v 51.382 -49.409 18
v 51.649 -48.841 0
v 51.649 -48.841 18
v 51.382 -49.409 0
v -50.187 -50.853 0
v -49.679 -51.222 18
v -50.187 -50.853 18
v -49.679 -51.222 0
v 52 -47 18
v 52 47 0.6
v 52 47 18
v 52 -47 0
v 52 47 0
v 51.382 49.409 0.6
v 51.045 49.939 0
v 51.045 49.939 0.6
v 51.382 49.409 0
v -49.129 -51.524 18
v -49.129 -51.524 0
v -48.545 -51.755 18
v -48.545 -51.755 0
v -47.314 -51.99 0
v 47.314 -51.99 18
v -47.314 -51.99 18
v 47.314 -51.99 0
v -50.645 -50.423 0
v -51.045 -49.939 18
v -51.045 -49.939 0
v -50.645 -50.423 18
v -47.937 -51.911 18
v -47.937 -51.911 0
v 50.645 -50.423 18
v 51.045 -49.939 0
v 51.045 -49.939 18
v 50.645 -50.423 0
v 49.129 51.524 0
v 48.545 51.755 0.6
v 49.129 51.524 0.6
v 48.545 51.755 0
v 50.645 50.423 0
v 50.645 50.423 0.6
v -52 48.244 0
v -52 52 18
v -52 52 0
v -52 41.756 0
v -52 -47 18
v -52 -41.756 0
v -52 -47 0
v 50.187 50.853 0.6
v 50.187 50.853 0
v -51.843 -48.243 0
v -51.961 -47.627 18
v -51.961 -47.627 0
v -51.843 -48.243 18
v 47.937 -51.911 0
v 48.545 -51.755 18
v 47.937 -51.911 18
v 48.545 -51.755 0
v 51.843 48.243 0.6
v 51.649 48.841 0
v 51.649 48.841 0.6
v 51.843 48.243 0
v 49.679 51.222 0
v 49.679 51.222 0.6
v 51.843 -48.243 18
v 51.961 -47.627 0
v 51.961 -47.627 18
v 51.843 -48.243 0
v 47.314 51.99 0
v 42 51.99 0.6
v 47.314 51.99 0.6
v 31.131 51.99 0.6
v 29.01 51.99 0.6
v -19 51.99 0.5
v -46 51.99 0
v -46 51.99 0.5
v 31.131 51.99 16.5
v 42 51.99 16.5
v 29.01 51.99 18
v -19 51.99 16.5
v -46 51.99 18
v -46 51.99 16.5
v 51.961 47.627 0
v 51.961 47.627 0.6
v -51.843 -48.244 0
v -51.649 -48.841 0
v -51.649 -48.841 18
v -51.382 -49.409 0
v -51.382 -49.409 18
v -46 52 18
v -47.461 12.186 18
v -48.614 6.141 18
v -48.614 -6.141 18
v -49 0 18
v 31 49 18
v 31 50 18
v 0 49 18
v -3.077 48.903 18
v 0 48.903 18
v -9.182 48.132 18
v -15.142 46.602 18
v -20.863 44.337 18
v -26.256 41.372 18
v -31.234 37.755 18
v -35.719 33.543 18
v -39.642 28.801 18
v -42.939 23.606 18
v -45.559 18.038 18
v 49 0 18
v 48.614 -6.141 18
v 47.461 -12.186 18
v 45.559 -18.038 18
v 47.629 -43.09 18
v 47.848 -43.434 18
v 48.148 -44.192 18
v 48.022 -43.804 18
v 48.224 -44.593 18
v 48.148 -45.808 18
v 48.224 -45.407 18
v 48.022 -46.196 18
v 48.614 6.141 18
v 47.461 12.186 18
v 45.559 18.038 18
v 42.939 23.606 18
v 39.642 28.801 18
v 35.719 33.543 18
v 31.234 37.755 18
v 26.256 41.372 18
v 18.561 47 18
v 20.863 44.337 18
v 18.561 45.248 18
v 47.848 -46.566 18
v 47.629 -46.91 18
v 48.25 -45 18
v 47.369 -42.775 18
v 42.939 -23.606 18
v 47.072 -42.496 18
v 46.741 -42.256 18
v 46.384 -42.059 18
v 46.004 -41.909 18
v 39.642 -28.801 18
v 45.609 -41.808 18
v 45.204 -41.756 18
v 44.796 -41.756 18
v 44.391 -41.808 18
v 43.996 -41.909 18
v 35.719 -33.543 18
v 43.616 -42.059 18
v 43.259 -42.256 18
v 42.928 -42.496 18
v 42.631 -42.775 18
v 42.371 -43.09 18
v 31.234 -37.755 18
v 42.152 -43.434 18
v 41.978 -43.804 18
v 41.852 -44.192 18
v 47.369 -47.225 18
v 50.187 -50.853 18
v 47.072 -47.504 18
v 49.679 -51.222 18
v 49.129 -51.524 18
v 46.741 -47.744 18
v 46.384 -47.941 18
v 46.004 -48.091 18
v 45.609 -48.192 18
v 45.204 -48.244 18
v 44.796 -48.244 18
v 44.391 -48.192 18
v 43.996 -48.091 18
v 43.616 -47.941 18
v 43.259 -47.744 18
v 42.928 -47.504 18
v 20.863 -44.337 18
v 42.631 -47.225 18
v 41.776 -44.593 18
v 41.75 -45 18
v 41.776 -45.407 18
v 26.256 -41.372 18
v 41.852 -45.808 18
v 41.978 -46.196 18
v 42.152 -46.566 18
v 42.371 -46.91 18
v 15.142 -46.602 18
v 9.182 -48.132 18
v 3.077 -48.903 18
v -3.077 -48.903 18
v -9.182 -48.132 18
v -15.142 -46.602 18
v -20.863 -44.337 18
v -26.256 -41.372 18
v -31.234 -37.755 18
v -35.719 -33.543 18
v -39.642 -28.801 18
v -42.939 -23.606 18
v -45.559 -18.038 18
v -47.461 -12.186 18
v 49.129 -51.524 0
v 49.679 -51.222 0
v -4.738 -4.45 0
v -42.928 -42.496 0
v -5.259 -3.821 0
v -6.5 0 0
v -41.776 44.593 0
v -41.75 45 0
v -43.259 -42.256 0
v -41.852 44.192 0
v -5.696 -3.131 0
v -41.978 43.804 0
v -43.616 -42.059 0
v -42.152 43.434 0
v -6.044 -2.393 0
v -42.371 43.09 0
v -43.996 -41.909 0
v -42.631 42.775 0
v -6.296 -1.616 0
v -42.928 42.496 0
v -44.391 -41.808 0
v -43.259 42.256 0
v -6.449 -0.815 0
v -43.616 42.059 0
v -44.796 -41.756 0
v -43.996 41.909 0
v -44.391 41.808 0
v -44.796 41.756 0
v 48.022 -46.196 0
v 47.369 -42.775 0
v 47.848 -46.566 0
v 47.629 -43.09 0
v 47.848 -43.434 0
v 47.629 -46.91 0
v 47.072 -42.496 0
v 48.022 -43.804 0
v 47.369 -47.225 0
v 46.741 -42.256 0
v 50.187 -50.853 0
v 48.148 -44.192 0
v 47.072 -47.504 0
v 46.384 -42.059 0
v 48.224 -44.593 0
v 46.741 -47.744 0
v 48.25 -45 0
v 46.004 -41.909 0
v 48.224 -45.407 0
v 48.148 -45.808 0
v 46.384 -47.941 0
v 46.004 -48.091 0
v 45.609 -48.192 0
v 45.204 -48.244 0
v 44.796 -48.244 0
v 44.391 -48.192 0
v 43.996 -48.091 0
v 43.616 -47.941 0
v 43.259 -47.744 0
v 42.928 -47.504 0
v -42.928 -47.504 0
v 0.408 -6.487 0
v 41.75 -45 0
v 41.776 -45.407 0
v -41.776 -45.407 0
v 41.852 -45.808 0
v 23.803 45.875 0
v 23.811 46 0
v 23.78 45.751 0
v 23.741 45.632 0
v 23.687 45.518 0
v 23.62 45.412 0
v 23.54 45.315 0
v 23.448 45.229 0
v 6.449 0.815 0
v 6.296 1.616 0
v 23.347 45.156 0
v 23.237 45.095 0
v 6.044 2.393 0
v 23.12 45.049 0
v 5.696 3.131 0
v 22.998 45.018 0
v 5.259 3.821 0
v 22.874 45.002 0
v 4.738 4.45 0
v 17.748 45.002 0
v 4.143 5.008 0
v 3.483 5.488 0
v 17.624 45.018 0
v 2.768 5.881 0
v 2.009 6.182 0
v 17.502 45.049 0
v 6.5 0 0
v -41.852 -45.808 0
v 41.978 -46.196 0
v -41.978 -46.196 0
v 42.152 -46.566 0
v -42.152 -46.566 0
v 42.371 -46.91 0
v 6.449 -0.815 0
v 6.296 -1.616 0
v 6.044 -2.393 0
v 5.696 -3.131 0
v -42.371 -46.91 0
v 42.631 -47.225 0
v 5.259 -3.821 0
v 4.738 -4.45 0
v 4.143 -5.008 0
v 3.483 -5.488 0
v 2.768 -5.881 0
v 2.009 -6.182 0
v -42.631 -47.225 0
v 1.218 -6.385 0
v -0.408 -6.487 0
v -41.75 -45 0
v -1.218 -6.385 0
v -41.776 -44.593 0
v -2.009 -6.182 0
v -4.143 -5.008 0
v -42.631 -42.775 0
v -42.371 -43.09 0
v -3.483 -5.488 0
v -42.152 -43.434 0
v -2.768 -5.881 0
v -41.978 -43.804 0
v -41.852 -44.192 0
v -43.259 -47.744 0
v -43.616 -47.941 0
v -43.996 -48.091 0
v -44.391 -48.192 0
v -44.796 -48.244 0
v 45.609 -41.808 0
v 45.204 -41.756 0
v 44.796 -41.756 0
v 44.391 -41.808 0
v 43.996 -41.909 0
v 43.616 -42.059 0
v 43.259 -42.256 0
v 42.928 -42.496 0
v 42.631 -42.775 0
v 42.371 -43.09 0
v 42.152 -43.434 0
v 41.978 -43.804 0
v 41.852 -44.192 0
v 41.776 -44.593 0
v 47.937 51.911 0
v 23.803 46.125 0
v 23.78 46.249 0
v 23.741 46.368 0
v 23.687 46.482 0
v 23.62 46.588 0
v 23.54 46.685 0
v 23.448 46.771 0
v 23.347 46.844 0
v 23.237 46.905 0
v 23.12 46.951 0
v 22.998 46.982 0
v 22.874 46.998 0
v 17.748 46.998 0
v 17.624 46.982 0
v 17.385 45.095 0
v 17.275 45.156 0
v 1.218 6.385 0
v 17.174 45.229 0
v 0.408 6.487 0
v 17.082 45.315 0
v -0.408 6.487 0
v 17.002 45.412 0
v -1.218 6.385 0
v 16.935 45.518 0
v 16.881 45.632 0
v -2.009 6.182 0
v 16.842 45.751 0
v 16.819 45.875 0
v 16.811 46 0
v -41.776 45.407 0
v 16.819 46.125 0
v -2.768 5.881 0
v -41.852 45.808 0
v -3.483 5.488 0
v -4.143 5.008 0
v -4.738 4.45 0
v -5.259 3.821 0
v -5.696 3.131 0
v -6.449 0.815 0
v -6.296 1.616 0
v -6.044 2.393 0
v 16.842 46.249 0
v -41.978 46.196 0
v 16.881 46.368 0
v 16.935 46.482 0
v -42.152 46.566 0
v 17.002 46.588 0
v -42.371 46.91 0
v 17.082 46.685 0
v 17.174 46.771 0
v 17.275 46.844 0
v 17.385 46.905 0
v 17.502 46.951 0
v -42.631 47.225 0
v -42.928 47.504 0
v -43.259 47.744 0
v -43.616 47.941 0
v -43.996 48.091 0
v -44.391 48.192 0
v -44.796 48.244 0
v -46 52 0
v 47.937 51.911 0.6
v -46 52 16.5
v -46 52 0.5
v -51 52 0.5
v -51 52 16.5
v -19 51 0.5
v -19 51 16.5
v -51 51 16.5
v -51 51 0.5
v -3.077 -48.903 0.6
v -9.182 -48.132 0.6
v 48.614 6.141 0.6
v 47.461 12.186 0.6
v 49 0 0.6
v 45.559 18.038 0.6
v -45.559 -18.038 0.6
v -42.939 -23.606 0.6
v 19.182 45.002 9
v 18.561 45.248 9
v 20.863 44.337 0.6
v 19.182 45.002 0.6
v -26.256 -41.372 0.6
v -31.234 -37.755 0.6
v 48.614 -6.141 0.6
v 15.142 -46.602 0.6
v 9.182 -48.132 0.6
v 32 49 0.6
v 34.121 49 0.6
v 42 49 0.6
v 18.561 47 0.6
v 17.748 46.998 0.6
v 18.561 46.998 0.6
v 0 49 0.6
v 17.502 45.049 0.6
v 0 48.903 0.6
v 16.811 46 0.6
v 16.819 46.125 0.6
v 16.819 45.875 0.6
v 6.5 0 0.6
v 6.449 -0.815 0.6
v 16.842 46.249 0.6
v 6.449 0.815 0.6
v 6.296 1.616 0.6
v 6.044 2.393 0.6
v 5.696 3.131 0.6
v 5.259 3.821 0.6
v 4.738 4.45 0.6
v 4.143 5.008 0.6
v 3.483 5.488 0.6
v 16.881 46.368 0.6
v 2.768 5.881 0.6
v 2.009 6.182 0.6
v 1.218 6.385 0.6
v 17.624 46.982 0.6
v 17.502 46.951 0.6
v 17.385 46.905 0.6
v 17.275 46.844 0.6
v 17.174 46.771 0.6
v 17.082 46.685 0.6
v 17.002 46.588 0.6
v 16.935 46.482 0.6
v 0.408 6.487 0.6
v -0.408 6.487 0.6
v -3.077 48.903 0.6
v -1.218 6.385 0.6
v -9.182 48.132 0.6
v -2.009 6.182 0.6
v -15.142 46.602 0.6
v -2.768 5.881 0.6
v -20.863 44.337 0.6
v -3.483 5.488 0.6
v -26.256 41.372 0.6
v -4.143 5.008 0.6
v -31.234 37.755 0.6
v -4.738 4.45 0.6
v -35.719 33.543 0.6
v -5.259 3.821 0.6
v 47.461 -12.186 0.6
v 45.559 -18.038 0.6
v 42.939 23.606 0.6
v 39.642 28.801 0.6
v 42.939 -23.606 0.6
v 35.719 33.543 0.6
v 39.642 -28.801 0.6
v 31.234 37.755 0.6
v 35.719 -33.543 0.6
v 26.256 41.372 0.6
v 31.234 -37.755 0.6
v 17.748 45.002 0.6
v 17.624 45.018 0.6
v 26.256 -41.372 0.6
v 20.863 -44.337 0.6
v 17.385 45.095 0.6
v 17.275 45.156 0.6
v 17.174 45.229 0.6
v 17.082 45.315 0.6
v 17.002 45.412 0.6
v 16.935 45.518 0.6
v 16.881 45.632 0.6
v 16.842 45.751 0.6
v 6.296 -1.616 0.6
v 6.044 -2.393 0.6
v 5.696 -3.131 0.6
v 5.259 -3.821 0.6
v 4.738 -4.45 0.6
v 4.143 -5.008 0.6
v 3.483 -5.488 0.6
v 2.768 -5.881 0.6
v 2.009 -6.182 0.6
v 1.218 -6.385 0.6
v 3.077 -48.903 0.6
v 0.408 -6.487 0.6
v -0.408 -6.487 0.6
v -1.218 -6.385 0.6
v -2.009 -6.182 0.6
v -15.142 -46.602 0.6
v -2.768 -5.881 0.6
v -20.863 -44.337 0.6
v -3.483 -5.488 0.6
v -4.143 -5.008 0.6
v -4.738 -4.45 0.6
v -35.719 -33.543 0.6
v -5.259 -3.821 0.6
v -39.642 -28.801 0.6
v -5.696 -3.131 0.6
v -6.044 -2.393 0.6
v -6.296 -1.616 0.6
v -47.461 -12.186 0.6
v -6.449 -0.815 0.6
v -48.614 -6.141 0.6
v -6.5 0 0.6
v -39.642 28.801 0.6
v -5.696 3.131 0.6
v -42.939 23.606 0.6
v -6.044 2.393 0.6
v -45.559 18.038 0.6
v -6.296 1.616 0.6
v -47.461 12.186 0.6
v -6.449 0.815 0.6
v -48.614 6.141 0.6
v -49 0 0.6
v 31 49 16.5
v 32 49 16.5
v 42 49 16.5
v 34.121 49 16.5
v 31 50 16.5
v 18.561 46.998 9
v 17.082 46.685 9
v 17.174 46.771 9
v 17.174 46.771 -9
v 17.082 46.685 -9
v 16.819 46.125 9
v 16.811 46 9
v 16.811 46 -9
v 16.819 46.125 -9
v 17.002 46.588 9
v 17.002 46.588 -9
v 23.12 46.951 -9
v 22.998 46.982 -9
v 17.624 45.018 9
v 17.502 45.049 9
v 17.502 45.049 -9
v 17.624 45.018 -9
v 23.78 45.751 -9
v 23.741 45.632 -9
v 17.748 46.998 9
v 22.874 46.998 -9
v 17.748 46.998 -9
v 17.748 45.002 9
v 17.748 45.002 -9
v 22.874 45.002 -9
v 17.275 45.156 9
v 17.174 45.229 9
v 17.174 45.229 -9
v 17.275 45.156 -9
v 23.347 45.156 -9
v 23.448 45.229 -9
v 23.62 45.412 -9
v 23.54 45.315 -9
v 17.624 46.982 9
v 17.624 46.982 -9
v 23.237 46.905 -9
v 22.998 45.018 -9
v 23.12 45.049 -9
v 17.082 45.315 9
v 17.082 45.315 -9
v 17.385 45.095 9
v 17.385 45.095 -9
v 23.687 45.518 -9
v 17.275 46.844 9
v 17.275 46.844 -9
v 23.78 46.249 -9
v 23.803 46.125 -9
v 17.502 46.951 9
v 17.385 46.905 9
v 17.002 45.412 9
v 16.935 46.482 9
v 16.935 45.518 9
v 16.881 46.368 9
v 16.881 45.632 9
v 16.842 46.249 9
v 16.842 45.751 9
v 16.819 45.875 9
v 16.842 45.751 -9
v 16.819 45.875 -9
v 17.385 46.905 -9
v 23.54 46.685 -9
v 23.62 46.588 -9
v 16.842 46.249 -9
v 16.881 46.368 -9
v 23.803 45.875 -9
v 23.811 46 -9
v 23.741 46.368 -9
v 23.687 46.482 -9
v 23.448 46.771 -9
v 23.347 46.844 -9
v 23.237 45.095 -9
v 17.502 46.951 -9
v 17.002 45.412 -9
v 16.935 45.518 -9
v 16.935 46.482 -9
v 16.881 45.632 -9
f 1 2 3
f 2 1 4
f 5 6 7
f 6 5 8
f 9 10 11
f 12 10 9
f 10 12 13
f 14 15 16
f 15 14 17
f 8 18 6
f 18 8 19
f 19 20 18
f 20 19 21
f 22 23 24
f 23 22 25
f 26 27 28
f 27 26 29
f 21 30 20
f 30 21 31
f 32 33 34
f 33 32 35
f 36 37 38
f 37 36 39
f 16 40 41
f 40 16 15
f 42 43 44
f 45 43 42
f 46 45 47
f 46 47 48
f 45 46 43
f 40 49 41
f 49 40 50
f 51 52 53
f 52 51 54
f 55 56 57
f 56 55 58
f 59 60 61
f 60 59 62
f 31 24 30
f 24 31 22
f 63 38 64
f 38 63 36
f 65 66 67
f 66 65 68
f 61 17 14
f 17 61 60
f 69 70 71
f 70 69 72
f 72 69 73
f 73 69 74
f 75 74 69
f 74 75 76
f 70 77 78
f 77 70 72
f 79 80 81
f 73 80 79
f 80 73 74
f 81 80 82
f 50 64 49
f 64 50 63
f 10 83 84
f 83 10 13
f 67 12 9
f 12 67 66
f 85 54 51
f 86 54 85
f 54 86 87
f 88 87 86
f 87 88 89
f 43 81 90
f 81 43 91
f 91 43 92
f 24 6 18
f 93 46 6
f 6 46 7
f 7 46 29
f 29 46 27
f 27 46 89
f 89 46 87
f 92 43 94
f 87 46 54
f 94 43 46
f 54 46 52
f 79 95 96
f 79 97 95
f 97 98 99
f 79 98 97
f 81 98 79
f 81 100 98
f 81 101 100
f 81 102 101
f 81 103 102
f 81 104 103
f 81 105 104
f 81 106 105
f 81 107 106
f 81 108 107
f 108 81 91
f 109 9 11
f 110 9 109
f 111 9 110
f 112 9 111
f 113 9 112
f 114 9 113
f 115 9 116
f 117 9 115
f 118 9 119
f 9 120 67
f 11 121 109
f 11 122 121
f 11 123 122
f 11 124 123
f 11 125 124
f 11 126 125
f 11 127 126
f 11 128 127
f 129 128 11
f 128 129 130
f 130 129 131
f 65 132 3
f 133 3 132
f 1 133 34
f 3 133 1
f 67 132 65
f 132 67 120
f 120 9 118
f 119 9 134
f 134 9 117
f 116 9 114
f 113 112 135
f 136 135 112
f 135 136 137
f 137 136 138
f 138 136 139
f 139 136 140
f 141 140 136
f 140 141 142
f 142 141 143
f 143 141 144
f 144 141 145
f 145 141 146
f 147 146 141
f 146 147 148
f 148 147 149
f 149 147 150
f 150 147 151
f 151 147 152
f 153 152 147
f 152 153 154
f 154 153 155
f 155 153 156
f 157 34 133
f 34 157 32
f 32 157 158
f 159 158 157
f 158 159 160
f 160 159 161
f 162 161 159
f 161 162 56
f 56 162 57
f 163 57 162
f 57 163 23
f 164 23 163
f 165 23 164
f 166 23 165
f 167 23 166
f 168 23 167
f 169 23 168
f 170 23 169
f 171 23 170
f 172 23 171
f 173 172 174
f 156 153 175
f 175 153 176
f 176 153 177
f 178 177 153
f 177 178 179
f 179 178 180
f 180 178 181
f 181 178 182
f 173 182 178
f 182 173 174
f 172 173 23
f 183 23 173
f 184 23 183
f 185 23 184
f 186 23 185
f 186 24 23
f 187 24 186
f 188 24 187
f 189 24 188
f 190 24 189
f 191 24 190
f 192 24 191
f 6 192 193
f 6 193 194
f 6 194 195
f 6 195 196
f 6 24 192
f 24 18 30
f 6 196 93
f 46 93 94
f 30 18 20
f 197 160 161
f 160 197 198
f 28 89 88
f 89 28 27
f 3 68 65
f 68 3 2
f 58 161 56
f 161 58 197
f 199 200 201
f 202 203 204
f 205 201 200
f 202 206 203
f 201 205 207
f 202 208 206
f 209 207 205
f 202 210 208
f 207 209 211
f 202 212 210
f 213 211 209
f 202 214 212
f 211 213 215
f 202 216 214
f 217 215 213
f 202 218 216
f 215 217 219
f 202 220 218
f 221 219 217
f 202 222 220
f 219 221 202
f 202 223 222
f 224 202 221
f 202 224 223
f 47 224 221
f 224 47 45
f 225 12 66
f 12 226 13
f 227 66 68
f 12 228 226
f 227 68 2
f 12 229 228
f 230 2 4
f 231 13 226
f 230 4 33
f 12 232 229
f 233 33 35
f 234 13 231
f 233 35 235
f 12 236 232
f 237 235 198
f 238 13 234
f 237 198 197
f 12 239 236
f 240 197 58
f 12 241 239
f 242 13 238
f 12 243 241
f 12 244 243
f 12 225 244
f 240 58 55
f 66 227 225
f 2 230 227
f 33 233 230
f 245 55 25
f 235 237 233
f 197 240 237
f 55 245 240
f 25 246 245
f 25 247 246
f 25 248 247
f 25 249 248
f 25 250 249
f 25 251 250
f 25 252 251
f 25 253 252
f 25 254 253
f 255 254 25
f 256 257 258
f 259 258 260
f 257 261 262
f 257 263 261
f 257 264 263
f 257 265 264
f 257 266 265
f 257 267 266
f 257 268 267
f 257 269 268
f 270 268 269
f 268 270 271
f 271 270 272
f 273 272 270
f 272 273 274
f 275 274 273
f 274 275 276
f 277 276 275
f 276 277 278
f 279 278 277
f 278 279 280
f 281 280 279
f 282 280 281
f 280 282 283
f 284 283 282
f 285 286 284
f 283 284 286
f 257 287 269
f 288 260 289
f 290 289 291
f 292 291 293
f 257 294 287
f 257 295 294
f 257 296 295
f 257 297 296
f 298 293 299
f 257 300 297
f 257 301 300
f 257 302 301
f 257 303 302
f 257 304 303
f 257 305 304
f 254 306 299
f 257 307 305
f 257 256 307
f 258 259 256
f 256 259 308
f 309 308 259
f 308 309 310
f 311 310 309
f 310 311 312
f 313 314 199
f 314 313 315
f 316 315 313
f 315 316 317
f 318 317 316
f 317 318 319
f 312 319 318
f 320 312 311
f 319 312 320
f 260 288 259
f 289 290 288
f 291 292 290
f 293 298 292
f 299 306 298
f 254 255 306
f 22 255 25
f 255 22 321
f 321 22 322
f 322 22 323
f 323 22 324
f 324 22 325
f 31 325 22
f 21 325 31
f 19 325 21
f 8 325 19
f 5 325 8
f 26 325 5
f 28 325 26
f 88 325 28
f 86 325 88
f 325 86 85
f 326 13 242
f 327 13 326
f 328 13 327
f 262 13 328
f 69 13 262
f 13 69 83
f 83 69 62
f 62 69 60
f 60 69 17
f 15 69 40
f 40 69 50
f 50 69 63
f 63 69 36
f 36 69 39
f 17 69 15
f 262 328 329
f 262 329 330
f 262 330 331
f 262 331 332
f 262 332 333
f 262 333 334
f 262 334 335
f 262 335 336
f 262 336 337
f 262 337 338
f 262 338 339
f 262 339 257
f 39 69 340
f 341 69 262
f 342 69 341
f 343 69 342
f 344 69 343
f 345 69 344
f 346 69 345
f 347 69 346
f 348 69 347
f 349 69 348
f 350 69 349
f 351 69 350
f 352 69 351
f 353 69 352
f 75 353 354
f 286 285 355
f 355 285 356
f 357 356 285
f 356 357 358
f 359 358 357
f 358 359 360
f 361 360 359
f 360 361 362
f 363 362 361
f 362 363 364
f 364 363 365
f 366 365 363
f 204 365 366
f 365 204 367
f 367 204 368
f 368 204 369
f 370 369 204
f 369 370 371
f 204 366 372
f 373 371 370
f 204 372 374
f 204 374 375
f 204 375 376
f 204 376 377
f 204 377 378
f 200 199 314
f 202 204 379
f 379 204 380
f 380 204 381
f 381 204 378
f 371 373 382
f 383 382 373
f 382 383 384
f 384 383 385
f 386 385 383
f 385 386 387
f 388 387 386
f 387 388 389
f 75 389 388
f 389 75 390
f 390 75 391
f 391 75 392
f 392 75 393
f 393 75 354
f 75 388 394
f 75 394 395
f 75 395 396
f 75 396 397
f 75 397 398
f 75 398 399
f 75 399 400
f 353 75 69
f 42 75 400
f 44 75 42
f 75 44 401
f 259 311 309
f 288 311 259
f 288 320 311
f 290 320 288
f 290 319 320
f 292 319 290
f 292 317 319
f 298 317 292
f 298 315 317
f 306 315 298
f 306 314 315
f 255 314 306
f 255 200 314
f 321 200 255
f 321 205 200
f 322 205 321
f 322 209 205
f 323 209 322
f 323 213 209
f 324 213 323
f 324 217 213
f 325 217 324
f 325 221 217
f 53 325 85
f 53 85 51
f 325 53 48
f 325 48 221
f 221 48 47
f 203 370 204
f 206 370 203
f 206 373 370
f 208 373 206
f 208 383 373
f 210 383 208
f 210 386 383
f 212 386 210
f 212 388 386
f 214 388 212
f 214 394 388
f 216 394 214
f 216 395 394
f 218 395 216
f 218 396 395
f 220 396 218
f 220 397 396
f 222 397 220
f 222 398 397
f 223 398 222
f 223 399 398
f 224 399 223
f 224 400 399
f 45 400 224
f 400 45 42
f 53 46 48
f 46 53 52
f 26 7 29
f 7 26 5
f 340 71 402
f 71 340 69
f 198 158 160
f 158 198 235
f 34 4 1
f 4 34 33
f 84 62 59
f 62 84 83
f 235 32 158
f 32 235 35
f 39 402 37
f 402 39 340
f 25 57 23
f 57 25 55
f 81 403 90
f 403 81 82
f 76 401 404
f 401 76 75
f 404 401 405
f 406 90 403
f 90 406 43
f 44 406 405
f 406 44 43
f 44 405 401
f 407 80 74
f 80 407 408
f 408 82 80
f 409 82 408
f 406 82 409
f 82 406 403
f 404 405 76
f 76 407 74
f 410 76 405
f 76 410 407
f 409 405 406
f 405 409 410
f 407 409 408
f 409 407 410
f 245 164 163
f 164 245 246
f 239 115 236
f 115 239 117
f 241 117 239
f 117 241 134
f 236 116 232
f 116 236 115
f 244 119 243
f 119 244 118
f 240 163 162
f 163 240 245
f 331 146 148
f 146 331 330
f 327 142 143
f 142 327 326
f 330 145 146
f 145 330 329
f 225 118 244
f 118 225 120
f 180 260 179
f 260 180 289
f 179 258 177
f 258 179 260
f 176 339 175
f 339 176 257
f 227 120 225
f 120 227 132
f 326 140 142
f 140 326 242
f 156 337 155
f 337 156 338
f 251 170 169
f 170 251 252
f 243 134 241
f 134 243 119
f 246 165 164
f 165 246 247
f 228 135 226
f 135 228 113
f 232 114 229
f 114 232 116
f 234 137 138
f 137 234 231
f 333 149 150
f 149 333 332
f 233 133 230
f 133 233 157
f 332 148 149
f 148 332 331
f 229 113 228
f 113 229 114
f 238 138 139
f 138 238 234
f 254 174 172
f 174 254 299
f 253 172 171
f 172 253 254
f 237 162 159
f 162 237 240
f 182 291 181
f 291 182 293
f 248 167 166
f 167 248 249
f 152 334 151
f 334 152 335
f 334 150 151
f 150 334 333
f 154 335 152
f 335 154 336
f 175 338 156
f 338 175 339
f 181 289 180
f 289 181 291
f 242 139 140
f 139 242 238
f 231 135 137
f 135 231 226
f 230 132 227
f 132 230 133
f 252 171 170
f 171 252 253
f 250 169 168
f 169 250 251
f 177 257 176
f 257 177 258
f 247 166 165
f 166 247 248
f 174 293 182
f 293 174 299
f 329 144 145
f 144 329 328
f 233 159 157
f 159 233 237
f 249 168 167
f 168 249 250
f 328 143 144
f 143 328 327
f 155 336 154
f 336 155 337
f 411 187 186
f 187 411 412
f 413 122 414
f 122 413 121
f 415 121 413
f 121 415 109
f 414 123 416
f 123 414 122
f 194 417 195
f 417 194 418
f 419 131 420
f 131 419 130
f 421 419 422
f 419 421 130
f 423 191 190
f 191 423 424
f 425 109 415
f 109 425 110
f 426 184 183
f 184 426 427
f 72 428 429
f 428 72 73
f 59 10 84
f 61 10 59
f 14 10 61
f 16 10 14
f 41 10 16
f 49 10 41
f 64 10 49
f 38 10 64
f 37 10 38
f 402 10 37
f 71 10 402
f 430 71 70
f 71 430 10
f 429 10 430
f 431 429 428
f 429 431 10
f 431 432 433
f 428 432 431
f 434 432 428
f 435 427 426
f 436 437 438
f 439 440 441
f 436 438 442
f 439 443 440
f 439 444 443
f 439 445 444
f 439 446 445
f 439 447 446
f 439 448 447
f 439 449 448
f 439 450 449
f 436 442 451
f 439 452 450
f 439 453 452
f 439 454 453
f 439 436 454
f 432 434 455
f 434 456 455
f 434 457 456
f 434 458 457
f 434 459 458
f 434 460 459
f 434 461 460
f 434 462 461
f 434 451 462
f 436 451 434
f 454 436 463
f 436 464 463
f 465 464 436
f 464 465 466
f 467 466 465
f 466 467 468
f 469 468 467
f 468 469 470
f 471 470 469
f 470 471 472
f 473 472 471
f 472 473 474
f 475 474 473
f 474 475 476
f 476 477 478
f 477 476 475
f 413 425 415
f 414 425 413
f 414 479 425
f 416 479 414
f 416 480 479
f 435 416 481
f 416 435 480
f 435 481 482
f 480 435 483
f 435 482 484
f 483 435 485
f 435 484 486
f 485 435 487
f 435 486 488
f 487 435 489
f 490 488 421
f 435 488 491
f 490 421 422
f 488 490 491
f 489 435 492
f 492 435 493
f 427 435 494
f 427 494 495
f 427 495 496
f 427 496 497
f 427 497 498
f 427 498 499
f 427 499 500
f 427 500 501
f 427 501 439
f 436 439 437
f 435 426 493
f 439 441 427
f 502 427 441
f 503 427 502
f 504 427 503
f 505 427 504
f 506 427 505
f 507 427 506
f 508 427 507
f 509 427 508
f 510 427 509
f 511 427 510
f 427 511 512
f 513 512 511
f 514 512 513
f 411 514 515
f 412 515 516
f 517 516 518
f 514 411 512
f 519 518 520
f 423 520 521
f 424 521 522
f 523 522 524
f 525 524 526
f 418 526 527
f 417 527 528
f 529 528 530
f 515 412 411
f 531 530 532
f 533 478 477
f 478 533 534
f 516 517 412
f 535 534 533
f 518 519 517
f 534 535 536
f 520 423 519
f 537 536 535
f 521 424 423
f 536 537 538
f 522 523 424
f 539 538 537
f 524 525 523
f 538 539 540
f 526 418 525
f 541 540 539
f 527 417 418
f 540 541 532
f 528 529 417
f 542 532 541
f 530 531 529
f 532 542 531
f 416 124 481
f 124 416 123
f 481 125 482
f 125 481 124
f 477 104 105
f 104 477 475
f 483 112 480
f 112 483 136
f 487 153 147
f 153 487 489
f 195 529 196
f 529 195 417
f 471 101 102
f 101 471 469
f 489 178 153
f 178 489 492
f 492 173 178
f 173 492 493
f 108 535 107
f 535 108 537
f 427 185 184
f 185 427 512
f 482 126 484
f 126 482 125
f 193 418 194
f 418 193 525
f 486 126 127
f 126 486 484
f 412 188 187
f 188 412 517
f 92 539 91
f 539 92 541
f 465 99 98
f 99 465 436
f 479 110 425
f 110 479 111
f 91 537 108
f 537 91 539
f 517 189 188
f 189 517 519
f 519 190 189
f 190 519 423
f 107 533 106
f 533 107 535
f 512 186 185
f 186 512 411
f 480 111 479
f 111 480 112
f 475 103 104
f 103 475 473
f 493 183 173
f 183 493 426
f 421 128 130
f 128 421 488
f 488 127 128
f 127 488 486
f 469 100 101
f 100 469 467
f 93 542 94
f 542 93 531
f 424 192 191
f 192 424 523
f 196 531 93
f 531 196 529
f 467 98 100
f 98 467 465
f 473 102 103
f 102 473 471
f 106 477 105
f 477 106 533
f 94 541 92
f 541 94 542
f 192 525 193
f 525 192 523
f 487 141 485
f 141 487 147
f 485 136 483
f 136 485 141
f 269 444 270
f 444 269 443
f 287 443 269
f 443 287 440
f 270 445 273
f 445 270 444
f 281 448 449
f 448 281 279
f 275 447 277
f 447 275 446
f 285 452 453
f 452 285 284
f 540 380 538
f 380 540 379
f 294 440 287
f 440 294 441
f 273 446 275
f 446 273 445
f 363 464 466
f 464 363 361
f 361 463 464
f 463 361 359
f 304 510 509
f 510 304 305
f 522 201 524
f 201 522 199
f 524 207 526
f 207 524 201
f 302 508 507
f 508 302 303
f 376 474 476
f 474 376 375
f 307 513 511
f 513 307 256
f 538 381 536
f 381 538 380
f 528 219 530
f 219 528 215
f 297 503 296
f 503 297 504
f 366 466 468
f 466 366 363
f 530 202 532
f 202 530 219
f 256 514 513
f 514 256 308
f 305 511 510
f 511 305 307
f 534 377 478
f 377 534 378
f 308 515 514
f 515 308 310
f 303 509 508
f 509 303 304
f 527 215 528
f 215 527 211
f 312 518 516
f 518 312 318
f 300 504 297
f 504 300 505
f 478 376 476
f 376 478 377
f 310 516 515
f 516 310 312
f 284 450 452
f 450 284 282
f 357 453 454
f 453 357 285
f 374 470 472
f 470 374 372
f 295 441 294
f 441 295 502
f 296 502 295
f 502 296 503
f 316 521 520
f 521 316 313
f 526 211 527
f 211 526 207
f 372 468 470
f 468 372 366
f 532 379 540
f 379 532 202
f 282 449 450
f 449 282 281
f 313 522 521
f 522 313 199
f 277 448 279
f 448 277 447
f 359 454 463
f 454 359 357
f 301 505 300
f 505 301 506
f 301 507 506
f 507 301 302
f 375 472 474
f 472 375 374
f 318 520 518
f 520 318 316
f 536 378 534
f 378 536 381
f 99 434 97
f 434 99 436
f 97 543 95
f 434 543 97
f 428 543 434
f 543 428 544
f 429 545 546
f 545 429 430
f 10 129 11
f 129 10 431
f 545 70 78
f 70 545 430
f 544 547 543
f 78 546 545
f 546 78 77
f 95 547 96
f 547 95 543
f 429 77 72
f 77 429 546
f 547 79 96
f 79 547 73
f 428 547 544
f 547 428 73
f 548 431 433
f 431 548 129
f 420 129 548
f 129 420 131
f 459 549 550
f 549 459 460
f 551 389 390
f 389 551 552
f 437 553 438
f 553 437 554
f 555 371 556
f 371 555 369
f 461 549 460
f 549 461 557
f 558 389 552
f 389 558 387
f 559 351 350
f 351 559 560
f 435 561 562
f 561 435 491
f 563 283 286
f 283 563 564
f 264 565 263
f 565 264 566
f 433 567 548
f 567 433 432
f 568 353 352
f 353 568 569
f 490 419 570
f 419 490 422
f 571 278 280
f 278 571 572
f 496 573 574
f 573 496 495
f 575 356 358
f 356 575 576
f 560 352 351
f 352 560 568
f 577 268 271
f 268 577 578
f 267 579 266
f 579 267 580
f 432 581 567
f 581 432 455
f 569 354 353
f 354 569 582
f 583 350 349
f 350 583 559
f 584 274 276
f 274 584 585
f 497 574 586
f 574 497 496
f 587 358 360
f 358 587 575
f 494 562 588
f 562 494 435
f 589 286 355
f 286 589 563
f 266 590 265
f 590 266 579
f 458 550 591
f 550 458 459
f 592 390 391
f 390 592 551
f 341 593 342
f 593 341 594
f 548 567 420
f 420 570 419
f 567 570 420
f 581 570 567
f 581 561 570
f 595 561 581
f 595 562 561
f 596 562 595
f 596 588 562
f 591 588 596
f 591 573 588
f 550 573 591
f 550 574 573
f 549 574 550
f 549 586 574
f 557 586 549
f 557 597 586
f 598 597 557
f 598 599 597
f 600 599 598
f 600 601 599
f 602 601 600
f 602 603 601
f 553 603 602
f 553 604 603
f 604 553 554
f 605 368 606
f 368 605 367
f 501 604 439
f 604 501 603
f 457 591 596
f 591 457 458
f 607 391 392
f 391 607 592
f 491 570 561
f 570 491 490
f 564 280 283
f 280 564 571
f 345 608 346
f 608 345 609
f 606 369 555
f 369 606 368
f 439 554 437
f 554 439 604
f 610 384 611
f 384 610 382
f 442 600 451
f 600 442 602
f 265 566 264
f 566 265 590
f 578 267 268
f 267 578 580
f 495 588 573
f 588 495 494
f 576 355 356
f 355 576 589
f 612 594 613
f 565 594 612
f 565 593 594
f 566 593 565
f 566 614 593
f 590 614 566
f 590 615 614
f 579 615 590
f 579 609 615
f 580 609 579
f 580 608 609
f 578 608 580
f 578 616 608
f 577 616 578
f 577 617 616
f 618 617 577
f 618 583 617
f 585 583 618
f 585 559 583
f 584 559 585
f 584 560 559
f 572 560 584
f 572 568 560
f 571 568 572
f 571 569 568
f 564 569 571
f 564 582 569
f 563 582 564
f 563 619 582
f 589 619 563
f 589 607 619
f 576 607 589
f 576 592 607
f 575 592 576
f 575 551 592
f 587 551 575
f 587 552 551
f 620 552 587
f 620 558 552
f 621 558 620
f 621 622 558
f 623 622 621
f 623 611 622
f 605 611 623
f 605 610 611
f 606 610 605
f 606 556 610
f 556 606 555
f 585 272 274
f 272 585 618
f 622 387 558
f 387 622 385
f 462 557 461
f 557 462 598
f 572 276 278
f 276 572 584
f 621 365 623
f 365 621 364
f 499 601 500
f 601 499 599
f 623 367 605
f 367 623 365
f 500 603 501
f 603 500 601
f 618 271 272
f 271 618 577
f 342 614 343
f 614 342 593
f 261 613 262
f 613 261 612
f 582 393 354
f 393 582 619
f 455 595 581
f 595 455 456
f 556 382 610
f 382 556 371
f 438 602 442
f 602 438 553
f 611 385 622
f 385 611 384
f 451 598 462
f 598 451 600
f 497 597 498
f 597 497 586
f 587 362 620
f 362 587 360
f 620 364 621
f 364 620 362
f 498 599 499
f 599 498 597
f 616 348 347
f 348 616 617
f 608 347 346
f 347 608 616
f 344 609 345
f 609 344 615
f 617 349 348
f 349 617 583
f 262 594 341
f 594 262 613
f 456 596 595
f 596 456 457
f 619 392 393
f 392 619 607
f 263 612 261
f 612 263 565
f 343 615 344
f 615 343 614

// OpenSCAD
$fn = 50;


union() {
	difference() {
		union() {
			hull() {
				translate(v = [-47.0000000000, 47.0000000000, 0]) {
					cylinder(h = 18, r = 5);
				}
				translate(v = [47.0000000000, 47.0000000000, 0]) {
					cylinder(h = 18, r = 5);
				}
				translate(v = [-47.0000000000, -47.0000000000, 0]) {
					cylinder(h = 18, r = 5);
				}
				translate(v = [47.0000000000, -47.0000000000, 0]) {
					cylinder(h = 18, r = 5);
				}
			}
			translate(v = [-52.0000000000, 46.0000000000, 0]) {
				cube(size = [6, 6, 18]);
			}
		}
		union() {
			translate(v = [-52.5000000000, -45.0000000000, -250.0000000000]) {
				rotate(a = [0, 0, 0]) {
					difference() {
						union() {
							hull() {
								translate(v = [7.5000000000, 0, 0]) {
									cylinder(h = 250, r = 3.2500000000, r1 = 3.2500000000, r2 = 3.2500000000);
								}
								translate(v = [-7.5000000000, 0, 0]) {
									cylinder(h = 250, r = 3.2500000000, r1 = 3.2500000000, r2 = 3.2500000000);
								}
							}
						}
						union();
					}
				}
			}
			translate(v = [-52.5000000000, 45.0000000000, -250.0000000000]) {
				rotate(a = [0, 0, 0]) {
					difference() {
						union() {
							hull() {
								translate(v = [7.5000000000, 0, 0]) {
									cylinder(h = 250, r = 3.2500000000, r1 = 3.2500000000, r2 = 3.2500000000);
								}
								translate(v = [-7.5000000000, 0, 0]) {
									cylinder(h = 250, r = 3.2500000000, r1 = 3.2500000000, r2 = 3.2500000000);
								}
							}
						}
						union();
					}
				}
			}
			translate(v = [-51.0000000000, 51.0000000000, 0.5000000000]) {
				cube(size = [32, 1, 16]);
			}
			translate(v = [45.0000000000, -45.0000000000, 0]) {
				cylinder(h = 100, r = 3.2500000000);
			}
			translate(v = [0, 0, 0.6000000000]) {
				cylinder(h = 20.4000000000, r = 49.0000000000);
			}
			translate(v = [0, 0, -9.0000000000]) {
				cylinder(h = 18, r = 6.5000000000);
			}
			translate(v = [0.0000000000, 47.0000000000, 0.6000000000]) {
				cube(size = [52.0000000000, 2, 20.4000000000]);
			}
			translate(v = [42.0000000000, 47.0000000000, 0.6000000000]) {
				cube(size = [10, 5, 20.4000000000]);
			}
			translate(v = [31.0000000000, 47.0000000000, 16.5000000000]) {
				cube(size = [21, 5, 1.5000000000]);
			}
			translate(v = [28.2500000000, 52.7500000000, 0.6000000000]) {
				rotate(a = [0, 0, -45]) {
					cube(size = [7.5000000000, 1.5000000000, 20.4000000000]);
				}
			}
			translate(v = [11.0610000000, 45.0000000000, 0.6000000000]) {
				cube(size = [7.5000000000, 2, 17.4000000000]);
			}
		}
	}
	union() {
		translate(v = [20.3110000000, 46.0000000000, -9.0000000000]) {
			rotate(a = [0, 0, 0]) {
				difference() {
					union() {
						#hull() {
							#translate(v = [2.5000000000, 0, 0]) {
								cylinder(h = 18, r = 1.0000000000, r1 = 1.0000000000, r2 = 1.0000000000);
							}
							#translate(v = [-2.5000000000, 0, 0]) {
								cylinder(h = 18, r = 1.0000000000, r1 = 1.0000000000, r2 = 1.0000000000);
							}
						}
					}
					union();
				}
			}
		}
	}
}
